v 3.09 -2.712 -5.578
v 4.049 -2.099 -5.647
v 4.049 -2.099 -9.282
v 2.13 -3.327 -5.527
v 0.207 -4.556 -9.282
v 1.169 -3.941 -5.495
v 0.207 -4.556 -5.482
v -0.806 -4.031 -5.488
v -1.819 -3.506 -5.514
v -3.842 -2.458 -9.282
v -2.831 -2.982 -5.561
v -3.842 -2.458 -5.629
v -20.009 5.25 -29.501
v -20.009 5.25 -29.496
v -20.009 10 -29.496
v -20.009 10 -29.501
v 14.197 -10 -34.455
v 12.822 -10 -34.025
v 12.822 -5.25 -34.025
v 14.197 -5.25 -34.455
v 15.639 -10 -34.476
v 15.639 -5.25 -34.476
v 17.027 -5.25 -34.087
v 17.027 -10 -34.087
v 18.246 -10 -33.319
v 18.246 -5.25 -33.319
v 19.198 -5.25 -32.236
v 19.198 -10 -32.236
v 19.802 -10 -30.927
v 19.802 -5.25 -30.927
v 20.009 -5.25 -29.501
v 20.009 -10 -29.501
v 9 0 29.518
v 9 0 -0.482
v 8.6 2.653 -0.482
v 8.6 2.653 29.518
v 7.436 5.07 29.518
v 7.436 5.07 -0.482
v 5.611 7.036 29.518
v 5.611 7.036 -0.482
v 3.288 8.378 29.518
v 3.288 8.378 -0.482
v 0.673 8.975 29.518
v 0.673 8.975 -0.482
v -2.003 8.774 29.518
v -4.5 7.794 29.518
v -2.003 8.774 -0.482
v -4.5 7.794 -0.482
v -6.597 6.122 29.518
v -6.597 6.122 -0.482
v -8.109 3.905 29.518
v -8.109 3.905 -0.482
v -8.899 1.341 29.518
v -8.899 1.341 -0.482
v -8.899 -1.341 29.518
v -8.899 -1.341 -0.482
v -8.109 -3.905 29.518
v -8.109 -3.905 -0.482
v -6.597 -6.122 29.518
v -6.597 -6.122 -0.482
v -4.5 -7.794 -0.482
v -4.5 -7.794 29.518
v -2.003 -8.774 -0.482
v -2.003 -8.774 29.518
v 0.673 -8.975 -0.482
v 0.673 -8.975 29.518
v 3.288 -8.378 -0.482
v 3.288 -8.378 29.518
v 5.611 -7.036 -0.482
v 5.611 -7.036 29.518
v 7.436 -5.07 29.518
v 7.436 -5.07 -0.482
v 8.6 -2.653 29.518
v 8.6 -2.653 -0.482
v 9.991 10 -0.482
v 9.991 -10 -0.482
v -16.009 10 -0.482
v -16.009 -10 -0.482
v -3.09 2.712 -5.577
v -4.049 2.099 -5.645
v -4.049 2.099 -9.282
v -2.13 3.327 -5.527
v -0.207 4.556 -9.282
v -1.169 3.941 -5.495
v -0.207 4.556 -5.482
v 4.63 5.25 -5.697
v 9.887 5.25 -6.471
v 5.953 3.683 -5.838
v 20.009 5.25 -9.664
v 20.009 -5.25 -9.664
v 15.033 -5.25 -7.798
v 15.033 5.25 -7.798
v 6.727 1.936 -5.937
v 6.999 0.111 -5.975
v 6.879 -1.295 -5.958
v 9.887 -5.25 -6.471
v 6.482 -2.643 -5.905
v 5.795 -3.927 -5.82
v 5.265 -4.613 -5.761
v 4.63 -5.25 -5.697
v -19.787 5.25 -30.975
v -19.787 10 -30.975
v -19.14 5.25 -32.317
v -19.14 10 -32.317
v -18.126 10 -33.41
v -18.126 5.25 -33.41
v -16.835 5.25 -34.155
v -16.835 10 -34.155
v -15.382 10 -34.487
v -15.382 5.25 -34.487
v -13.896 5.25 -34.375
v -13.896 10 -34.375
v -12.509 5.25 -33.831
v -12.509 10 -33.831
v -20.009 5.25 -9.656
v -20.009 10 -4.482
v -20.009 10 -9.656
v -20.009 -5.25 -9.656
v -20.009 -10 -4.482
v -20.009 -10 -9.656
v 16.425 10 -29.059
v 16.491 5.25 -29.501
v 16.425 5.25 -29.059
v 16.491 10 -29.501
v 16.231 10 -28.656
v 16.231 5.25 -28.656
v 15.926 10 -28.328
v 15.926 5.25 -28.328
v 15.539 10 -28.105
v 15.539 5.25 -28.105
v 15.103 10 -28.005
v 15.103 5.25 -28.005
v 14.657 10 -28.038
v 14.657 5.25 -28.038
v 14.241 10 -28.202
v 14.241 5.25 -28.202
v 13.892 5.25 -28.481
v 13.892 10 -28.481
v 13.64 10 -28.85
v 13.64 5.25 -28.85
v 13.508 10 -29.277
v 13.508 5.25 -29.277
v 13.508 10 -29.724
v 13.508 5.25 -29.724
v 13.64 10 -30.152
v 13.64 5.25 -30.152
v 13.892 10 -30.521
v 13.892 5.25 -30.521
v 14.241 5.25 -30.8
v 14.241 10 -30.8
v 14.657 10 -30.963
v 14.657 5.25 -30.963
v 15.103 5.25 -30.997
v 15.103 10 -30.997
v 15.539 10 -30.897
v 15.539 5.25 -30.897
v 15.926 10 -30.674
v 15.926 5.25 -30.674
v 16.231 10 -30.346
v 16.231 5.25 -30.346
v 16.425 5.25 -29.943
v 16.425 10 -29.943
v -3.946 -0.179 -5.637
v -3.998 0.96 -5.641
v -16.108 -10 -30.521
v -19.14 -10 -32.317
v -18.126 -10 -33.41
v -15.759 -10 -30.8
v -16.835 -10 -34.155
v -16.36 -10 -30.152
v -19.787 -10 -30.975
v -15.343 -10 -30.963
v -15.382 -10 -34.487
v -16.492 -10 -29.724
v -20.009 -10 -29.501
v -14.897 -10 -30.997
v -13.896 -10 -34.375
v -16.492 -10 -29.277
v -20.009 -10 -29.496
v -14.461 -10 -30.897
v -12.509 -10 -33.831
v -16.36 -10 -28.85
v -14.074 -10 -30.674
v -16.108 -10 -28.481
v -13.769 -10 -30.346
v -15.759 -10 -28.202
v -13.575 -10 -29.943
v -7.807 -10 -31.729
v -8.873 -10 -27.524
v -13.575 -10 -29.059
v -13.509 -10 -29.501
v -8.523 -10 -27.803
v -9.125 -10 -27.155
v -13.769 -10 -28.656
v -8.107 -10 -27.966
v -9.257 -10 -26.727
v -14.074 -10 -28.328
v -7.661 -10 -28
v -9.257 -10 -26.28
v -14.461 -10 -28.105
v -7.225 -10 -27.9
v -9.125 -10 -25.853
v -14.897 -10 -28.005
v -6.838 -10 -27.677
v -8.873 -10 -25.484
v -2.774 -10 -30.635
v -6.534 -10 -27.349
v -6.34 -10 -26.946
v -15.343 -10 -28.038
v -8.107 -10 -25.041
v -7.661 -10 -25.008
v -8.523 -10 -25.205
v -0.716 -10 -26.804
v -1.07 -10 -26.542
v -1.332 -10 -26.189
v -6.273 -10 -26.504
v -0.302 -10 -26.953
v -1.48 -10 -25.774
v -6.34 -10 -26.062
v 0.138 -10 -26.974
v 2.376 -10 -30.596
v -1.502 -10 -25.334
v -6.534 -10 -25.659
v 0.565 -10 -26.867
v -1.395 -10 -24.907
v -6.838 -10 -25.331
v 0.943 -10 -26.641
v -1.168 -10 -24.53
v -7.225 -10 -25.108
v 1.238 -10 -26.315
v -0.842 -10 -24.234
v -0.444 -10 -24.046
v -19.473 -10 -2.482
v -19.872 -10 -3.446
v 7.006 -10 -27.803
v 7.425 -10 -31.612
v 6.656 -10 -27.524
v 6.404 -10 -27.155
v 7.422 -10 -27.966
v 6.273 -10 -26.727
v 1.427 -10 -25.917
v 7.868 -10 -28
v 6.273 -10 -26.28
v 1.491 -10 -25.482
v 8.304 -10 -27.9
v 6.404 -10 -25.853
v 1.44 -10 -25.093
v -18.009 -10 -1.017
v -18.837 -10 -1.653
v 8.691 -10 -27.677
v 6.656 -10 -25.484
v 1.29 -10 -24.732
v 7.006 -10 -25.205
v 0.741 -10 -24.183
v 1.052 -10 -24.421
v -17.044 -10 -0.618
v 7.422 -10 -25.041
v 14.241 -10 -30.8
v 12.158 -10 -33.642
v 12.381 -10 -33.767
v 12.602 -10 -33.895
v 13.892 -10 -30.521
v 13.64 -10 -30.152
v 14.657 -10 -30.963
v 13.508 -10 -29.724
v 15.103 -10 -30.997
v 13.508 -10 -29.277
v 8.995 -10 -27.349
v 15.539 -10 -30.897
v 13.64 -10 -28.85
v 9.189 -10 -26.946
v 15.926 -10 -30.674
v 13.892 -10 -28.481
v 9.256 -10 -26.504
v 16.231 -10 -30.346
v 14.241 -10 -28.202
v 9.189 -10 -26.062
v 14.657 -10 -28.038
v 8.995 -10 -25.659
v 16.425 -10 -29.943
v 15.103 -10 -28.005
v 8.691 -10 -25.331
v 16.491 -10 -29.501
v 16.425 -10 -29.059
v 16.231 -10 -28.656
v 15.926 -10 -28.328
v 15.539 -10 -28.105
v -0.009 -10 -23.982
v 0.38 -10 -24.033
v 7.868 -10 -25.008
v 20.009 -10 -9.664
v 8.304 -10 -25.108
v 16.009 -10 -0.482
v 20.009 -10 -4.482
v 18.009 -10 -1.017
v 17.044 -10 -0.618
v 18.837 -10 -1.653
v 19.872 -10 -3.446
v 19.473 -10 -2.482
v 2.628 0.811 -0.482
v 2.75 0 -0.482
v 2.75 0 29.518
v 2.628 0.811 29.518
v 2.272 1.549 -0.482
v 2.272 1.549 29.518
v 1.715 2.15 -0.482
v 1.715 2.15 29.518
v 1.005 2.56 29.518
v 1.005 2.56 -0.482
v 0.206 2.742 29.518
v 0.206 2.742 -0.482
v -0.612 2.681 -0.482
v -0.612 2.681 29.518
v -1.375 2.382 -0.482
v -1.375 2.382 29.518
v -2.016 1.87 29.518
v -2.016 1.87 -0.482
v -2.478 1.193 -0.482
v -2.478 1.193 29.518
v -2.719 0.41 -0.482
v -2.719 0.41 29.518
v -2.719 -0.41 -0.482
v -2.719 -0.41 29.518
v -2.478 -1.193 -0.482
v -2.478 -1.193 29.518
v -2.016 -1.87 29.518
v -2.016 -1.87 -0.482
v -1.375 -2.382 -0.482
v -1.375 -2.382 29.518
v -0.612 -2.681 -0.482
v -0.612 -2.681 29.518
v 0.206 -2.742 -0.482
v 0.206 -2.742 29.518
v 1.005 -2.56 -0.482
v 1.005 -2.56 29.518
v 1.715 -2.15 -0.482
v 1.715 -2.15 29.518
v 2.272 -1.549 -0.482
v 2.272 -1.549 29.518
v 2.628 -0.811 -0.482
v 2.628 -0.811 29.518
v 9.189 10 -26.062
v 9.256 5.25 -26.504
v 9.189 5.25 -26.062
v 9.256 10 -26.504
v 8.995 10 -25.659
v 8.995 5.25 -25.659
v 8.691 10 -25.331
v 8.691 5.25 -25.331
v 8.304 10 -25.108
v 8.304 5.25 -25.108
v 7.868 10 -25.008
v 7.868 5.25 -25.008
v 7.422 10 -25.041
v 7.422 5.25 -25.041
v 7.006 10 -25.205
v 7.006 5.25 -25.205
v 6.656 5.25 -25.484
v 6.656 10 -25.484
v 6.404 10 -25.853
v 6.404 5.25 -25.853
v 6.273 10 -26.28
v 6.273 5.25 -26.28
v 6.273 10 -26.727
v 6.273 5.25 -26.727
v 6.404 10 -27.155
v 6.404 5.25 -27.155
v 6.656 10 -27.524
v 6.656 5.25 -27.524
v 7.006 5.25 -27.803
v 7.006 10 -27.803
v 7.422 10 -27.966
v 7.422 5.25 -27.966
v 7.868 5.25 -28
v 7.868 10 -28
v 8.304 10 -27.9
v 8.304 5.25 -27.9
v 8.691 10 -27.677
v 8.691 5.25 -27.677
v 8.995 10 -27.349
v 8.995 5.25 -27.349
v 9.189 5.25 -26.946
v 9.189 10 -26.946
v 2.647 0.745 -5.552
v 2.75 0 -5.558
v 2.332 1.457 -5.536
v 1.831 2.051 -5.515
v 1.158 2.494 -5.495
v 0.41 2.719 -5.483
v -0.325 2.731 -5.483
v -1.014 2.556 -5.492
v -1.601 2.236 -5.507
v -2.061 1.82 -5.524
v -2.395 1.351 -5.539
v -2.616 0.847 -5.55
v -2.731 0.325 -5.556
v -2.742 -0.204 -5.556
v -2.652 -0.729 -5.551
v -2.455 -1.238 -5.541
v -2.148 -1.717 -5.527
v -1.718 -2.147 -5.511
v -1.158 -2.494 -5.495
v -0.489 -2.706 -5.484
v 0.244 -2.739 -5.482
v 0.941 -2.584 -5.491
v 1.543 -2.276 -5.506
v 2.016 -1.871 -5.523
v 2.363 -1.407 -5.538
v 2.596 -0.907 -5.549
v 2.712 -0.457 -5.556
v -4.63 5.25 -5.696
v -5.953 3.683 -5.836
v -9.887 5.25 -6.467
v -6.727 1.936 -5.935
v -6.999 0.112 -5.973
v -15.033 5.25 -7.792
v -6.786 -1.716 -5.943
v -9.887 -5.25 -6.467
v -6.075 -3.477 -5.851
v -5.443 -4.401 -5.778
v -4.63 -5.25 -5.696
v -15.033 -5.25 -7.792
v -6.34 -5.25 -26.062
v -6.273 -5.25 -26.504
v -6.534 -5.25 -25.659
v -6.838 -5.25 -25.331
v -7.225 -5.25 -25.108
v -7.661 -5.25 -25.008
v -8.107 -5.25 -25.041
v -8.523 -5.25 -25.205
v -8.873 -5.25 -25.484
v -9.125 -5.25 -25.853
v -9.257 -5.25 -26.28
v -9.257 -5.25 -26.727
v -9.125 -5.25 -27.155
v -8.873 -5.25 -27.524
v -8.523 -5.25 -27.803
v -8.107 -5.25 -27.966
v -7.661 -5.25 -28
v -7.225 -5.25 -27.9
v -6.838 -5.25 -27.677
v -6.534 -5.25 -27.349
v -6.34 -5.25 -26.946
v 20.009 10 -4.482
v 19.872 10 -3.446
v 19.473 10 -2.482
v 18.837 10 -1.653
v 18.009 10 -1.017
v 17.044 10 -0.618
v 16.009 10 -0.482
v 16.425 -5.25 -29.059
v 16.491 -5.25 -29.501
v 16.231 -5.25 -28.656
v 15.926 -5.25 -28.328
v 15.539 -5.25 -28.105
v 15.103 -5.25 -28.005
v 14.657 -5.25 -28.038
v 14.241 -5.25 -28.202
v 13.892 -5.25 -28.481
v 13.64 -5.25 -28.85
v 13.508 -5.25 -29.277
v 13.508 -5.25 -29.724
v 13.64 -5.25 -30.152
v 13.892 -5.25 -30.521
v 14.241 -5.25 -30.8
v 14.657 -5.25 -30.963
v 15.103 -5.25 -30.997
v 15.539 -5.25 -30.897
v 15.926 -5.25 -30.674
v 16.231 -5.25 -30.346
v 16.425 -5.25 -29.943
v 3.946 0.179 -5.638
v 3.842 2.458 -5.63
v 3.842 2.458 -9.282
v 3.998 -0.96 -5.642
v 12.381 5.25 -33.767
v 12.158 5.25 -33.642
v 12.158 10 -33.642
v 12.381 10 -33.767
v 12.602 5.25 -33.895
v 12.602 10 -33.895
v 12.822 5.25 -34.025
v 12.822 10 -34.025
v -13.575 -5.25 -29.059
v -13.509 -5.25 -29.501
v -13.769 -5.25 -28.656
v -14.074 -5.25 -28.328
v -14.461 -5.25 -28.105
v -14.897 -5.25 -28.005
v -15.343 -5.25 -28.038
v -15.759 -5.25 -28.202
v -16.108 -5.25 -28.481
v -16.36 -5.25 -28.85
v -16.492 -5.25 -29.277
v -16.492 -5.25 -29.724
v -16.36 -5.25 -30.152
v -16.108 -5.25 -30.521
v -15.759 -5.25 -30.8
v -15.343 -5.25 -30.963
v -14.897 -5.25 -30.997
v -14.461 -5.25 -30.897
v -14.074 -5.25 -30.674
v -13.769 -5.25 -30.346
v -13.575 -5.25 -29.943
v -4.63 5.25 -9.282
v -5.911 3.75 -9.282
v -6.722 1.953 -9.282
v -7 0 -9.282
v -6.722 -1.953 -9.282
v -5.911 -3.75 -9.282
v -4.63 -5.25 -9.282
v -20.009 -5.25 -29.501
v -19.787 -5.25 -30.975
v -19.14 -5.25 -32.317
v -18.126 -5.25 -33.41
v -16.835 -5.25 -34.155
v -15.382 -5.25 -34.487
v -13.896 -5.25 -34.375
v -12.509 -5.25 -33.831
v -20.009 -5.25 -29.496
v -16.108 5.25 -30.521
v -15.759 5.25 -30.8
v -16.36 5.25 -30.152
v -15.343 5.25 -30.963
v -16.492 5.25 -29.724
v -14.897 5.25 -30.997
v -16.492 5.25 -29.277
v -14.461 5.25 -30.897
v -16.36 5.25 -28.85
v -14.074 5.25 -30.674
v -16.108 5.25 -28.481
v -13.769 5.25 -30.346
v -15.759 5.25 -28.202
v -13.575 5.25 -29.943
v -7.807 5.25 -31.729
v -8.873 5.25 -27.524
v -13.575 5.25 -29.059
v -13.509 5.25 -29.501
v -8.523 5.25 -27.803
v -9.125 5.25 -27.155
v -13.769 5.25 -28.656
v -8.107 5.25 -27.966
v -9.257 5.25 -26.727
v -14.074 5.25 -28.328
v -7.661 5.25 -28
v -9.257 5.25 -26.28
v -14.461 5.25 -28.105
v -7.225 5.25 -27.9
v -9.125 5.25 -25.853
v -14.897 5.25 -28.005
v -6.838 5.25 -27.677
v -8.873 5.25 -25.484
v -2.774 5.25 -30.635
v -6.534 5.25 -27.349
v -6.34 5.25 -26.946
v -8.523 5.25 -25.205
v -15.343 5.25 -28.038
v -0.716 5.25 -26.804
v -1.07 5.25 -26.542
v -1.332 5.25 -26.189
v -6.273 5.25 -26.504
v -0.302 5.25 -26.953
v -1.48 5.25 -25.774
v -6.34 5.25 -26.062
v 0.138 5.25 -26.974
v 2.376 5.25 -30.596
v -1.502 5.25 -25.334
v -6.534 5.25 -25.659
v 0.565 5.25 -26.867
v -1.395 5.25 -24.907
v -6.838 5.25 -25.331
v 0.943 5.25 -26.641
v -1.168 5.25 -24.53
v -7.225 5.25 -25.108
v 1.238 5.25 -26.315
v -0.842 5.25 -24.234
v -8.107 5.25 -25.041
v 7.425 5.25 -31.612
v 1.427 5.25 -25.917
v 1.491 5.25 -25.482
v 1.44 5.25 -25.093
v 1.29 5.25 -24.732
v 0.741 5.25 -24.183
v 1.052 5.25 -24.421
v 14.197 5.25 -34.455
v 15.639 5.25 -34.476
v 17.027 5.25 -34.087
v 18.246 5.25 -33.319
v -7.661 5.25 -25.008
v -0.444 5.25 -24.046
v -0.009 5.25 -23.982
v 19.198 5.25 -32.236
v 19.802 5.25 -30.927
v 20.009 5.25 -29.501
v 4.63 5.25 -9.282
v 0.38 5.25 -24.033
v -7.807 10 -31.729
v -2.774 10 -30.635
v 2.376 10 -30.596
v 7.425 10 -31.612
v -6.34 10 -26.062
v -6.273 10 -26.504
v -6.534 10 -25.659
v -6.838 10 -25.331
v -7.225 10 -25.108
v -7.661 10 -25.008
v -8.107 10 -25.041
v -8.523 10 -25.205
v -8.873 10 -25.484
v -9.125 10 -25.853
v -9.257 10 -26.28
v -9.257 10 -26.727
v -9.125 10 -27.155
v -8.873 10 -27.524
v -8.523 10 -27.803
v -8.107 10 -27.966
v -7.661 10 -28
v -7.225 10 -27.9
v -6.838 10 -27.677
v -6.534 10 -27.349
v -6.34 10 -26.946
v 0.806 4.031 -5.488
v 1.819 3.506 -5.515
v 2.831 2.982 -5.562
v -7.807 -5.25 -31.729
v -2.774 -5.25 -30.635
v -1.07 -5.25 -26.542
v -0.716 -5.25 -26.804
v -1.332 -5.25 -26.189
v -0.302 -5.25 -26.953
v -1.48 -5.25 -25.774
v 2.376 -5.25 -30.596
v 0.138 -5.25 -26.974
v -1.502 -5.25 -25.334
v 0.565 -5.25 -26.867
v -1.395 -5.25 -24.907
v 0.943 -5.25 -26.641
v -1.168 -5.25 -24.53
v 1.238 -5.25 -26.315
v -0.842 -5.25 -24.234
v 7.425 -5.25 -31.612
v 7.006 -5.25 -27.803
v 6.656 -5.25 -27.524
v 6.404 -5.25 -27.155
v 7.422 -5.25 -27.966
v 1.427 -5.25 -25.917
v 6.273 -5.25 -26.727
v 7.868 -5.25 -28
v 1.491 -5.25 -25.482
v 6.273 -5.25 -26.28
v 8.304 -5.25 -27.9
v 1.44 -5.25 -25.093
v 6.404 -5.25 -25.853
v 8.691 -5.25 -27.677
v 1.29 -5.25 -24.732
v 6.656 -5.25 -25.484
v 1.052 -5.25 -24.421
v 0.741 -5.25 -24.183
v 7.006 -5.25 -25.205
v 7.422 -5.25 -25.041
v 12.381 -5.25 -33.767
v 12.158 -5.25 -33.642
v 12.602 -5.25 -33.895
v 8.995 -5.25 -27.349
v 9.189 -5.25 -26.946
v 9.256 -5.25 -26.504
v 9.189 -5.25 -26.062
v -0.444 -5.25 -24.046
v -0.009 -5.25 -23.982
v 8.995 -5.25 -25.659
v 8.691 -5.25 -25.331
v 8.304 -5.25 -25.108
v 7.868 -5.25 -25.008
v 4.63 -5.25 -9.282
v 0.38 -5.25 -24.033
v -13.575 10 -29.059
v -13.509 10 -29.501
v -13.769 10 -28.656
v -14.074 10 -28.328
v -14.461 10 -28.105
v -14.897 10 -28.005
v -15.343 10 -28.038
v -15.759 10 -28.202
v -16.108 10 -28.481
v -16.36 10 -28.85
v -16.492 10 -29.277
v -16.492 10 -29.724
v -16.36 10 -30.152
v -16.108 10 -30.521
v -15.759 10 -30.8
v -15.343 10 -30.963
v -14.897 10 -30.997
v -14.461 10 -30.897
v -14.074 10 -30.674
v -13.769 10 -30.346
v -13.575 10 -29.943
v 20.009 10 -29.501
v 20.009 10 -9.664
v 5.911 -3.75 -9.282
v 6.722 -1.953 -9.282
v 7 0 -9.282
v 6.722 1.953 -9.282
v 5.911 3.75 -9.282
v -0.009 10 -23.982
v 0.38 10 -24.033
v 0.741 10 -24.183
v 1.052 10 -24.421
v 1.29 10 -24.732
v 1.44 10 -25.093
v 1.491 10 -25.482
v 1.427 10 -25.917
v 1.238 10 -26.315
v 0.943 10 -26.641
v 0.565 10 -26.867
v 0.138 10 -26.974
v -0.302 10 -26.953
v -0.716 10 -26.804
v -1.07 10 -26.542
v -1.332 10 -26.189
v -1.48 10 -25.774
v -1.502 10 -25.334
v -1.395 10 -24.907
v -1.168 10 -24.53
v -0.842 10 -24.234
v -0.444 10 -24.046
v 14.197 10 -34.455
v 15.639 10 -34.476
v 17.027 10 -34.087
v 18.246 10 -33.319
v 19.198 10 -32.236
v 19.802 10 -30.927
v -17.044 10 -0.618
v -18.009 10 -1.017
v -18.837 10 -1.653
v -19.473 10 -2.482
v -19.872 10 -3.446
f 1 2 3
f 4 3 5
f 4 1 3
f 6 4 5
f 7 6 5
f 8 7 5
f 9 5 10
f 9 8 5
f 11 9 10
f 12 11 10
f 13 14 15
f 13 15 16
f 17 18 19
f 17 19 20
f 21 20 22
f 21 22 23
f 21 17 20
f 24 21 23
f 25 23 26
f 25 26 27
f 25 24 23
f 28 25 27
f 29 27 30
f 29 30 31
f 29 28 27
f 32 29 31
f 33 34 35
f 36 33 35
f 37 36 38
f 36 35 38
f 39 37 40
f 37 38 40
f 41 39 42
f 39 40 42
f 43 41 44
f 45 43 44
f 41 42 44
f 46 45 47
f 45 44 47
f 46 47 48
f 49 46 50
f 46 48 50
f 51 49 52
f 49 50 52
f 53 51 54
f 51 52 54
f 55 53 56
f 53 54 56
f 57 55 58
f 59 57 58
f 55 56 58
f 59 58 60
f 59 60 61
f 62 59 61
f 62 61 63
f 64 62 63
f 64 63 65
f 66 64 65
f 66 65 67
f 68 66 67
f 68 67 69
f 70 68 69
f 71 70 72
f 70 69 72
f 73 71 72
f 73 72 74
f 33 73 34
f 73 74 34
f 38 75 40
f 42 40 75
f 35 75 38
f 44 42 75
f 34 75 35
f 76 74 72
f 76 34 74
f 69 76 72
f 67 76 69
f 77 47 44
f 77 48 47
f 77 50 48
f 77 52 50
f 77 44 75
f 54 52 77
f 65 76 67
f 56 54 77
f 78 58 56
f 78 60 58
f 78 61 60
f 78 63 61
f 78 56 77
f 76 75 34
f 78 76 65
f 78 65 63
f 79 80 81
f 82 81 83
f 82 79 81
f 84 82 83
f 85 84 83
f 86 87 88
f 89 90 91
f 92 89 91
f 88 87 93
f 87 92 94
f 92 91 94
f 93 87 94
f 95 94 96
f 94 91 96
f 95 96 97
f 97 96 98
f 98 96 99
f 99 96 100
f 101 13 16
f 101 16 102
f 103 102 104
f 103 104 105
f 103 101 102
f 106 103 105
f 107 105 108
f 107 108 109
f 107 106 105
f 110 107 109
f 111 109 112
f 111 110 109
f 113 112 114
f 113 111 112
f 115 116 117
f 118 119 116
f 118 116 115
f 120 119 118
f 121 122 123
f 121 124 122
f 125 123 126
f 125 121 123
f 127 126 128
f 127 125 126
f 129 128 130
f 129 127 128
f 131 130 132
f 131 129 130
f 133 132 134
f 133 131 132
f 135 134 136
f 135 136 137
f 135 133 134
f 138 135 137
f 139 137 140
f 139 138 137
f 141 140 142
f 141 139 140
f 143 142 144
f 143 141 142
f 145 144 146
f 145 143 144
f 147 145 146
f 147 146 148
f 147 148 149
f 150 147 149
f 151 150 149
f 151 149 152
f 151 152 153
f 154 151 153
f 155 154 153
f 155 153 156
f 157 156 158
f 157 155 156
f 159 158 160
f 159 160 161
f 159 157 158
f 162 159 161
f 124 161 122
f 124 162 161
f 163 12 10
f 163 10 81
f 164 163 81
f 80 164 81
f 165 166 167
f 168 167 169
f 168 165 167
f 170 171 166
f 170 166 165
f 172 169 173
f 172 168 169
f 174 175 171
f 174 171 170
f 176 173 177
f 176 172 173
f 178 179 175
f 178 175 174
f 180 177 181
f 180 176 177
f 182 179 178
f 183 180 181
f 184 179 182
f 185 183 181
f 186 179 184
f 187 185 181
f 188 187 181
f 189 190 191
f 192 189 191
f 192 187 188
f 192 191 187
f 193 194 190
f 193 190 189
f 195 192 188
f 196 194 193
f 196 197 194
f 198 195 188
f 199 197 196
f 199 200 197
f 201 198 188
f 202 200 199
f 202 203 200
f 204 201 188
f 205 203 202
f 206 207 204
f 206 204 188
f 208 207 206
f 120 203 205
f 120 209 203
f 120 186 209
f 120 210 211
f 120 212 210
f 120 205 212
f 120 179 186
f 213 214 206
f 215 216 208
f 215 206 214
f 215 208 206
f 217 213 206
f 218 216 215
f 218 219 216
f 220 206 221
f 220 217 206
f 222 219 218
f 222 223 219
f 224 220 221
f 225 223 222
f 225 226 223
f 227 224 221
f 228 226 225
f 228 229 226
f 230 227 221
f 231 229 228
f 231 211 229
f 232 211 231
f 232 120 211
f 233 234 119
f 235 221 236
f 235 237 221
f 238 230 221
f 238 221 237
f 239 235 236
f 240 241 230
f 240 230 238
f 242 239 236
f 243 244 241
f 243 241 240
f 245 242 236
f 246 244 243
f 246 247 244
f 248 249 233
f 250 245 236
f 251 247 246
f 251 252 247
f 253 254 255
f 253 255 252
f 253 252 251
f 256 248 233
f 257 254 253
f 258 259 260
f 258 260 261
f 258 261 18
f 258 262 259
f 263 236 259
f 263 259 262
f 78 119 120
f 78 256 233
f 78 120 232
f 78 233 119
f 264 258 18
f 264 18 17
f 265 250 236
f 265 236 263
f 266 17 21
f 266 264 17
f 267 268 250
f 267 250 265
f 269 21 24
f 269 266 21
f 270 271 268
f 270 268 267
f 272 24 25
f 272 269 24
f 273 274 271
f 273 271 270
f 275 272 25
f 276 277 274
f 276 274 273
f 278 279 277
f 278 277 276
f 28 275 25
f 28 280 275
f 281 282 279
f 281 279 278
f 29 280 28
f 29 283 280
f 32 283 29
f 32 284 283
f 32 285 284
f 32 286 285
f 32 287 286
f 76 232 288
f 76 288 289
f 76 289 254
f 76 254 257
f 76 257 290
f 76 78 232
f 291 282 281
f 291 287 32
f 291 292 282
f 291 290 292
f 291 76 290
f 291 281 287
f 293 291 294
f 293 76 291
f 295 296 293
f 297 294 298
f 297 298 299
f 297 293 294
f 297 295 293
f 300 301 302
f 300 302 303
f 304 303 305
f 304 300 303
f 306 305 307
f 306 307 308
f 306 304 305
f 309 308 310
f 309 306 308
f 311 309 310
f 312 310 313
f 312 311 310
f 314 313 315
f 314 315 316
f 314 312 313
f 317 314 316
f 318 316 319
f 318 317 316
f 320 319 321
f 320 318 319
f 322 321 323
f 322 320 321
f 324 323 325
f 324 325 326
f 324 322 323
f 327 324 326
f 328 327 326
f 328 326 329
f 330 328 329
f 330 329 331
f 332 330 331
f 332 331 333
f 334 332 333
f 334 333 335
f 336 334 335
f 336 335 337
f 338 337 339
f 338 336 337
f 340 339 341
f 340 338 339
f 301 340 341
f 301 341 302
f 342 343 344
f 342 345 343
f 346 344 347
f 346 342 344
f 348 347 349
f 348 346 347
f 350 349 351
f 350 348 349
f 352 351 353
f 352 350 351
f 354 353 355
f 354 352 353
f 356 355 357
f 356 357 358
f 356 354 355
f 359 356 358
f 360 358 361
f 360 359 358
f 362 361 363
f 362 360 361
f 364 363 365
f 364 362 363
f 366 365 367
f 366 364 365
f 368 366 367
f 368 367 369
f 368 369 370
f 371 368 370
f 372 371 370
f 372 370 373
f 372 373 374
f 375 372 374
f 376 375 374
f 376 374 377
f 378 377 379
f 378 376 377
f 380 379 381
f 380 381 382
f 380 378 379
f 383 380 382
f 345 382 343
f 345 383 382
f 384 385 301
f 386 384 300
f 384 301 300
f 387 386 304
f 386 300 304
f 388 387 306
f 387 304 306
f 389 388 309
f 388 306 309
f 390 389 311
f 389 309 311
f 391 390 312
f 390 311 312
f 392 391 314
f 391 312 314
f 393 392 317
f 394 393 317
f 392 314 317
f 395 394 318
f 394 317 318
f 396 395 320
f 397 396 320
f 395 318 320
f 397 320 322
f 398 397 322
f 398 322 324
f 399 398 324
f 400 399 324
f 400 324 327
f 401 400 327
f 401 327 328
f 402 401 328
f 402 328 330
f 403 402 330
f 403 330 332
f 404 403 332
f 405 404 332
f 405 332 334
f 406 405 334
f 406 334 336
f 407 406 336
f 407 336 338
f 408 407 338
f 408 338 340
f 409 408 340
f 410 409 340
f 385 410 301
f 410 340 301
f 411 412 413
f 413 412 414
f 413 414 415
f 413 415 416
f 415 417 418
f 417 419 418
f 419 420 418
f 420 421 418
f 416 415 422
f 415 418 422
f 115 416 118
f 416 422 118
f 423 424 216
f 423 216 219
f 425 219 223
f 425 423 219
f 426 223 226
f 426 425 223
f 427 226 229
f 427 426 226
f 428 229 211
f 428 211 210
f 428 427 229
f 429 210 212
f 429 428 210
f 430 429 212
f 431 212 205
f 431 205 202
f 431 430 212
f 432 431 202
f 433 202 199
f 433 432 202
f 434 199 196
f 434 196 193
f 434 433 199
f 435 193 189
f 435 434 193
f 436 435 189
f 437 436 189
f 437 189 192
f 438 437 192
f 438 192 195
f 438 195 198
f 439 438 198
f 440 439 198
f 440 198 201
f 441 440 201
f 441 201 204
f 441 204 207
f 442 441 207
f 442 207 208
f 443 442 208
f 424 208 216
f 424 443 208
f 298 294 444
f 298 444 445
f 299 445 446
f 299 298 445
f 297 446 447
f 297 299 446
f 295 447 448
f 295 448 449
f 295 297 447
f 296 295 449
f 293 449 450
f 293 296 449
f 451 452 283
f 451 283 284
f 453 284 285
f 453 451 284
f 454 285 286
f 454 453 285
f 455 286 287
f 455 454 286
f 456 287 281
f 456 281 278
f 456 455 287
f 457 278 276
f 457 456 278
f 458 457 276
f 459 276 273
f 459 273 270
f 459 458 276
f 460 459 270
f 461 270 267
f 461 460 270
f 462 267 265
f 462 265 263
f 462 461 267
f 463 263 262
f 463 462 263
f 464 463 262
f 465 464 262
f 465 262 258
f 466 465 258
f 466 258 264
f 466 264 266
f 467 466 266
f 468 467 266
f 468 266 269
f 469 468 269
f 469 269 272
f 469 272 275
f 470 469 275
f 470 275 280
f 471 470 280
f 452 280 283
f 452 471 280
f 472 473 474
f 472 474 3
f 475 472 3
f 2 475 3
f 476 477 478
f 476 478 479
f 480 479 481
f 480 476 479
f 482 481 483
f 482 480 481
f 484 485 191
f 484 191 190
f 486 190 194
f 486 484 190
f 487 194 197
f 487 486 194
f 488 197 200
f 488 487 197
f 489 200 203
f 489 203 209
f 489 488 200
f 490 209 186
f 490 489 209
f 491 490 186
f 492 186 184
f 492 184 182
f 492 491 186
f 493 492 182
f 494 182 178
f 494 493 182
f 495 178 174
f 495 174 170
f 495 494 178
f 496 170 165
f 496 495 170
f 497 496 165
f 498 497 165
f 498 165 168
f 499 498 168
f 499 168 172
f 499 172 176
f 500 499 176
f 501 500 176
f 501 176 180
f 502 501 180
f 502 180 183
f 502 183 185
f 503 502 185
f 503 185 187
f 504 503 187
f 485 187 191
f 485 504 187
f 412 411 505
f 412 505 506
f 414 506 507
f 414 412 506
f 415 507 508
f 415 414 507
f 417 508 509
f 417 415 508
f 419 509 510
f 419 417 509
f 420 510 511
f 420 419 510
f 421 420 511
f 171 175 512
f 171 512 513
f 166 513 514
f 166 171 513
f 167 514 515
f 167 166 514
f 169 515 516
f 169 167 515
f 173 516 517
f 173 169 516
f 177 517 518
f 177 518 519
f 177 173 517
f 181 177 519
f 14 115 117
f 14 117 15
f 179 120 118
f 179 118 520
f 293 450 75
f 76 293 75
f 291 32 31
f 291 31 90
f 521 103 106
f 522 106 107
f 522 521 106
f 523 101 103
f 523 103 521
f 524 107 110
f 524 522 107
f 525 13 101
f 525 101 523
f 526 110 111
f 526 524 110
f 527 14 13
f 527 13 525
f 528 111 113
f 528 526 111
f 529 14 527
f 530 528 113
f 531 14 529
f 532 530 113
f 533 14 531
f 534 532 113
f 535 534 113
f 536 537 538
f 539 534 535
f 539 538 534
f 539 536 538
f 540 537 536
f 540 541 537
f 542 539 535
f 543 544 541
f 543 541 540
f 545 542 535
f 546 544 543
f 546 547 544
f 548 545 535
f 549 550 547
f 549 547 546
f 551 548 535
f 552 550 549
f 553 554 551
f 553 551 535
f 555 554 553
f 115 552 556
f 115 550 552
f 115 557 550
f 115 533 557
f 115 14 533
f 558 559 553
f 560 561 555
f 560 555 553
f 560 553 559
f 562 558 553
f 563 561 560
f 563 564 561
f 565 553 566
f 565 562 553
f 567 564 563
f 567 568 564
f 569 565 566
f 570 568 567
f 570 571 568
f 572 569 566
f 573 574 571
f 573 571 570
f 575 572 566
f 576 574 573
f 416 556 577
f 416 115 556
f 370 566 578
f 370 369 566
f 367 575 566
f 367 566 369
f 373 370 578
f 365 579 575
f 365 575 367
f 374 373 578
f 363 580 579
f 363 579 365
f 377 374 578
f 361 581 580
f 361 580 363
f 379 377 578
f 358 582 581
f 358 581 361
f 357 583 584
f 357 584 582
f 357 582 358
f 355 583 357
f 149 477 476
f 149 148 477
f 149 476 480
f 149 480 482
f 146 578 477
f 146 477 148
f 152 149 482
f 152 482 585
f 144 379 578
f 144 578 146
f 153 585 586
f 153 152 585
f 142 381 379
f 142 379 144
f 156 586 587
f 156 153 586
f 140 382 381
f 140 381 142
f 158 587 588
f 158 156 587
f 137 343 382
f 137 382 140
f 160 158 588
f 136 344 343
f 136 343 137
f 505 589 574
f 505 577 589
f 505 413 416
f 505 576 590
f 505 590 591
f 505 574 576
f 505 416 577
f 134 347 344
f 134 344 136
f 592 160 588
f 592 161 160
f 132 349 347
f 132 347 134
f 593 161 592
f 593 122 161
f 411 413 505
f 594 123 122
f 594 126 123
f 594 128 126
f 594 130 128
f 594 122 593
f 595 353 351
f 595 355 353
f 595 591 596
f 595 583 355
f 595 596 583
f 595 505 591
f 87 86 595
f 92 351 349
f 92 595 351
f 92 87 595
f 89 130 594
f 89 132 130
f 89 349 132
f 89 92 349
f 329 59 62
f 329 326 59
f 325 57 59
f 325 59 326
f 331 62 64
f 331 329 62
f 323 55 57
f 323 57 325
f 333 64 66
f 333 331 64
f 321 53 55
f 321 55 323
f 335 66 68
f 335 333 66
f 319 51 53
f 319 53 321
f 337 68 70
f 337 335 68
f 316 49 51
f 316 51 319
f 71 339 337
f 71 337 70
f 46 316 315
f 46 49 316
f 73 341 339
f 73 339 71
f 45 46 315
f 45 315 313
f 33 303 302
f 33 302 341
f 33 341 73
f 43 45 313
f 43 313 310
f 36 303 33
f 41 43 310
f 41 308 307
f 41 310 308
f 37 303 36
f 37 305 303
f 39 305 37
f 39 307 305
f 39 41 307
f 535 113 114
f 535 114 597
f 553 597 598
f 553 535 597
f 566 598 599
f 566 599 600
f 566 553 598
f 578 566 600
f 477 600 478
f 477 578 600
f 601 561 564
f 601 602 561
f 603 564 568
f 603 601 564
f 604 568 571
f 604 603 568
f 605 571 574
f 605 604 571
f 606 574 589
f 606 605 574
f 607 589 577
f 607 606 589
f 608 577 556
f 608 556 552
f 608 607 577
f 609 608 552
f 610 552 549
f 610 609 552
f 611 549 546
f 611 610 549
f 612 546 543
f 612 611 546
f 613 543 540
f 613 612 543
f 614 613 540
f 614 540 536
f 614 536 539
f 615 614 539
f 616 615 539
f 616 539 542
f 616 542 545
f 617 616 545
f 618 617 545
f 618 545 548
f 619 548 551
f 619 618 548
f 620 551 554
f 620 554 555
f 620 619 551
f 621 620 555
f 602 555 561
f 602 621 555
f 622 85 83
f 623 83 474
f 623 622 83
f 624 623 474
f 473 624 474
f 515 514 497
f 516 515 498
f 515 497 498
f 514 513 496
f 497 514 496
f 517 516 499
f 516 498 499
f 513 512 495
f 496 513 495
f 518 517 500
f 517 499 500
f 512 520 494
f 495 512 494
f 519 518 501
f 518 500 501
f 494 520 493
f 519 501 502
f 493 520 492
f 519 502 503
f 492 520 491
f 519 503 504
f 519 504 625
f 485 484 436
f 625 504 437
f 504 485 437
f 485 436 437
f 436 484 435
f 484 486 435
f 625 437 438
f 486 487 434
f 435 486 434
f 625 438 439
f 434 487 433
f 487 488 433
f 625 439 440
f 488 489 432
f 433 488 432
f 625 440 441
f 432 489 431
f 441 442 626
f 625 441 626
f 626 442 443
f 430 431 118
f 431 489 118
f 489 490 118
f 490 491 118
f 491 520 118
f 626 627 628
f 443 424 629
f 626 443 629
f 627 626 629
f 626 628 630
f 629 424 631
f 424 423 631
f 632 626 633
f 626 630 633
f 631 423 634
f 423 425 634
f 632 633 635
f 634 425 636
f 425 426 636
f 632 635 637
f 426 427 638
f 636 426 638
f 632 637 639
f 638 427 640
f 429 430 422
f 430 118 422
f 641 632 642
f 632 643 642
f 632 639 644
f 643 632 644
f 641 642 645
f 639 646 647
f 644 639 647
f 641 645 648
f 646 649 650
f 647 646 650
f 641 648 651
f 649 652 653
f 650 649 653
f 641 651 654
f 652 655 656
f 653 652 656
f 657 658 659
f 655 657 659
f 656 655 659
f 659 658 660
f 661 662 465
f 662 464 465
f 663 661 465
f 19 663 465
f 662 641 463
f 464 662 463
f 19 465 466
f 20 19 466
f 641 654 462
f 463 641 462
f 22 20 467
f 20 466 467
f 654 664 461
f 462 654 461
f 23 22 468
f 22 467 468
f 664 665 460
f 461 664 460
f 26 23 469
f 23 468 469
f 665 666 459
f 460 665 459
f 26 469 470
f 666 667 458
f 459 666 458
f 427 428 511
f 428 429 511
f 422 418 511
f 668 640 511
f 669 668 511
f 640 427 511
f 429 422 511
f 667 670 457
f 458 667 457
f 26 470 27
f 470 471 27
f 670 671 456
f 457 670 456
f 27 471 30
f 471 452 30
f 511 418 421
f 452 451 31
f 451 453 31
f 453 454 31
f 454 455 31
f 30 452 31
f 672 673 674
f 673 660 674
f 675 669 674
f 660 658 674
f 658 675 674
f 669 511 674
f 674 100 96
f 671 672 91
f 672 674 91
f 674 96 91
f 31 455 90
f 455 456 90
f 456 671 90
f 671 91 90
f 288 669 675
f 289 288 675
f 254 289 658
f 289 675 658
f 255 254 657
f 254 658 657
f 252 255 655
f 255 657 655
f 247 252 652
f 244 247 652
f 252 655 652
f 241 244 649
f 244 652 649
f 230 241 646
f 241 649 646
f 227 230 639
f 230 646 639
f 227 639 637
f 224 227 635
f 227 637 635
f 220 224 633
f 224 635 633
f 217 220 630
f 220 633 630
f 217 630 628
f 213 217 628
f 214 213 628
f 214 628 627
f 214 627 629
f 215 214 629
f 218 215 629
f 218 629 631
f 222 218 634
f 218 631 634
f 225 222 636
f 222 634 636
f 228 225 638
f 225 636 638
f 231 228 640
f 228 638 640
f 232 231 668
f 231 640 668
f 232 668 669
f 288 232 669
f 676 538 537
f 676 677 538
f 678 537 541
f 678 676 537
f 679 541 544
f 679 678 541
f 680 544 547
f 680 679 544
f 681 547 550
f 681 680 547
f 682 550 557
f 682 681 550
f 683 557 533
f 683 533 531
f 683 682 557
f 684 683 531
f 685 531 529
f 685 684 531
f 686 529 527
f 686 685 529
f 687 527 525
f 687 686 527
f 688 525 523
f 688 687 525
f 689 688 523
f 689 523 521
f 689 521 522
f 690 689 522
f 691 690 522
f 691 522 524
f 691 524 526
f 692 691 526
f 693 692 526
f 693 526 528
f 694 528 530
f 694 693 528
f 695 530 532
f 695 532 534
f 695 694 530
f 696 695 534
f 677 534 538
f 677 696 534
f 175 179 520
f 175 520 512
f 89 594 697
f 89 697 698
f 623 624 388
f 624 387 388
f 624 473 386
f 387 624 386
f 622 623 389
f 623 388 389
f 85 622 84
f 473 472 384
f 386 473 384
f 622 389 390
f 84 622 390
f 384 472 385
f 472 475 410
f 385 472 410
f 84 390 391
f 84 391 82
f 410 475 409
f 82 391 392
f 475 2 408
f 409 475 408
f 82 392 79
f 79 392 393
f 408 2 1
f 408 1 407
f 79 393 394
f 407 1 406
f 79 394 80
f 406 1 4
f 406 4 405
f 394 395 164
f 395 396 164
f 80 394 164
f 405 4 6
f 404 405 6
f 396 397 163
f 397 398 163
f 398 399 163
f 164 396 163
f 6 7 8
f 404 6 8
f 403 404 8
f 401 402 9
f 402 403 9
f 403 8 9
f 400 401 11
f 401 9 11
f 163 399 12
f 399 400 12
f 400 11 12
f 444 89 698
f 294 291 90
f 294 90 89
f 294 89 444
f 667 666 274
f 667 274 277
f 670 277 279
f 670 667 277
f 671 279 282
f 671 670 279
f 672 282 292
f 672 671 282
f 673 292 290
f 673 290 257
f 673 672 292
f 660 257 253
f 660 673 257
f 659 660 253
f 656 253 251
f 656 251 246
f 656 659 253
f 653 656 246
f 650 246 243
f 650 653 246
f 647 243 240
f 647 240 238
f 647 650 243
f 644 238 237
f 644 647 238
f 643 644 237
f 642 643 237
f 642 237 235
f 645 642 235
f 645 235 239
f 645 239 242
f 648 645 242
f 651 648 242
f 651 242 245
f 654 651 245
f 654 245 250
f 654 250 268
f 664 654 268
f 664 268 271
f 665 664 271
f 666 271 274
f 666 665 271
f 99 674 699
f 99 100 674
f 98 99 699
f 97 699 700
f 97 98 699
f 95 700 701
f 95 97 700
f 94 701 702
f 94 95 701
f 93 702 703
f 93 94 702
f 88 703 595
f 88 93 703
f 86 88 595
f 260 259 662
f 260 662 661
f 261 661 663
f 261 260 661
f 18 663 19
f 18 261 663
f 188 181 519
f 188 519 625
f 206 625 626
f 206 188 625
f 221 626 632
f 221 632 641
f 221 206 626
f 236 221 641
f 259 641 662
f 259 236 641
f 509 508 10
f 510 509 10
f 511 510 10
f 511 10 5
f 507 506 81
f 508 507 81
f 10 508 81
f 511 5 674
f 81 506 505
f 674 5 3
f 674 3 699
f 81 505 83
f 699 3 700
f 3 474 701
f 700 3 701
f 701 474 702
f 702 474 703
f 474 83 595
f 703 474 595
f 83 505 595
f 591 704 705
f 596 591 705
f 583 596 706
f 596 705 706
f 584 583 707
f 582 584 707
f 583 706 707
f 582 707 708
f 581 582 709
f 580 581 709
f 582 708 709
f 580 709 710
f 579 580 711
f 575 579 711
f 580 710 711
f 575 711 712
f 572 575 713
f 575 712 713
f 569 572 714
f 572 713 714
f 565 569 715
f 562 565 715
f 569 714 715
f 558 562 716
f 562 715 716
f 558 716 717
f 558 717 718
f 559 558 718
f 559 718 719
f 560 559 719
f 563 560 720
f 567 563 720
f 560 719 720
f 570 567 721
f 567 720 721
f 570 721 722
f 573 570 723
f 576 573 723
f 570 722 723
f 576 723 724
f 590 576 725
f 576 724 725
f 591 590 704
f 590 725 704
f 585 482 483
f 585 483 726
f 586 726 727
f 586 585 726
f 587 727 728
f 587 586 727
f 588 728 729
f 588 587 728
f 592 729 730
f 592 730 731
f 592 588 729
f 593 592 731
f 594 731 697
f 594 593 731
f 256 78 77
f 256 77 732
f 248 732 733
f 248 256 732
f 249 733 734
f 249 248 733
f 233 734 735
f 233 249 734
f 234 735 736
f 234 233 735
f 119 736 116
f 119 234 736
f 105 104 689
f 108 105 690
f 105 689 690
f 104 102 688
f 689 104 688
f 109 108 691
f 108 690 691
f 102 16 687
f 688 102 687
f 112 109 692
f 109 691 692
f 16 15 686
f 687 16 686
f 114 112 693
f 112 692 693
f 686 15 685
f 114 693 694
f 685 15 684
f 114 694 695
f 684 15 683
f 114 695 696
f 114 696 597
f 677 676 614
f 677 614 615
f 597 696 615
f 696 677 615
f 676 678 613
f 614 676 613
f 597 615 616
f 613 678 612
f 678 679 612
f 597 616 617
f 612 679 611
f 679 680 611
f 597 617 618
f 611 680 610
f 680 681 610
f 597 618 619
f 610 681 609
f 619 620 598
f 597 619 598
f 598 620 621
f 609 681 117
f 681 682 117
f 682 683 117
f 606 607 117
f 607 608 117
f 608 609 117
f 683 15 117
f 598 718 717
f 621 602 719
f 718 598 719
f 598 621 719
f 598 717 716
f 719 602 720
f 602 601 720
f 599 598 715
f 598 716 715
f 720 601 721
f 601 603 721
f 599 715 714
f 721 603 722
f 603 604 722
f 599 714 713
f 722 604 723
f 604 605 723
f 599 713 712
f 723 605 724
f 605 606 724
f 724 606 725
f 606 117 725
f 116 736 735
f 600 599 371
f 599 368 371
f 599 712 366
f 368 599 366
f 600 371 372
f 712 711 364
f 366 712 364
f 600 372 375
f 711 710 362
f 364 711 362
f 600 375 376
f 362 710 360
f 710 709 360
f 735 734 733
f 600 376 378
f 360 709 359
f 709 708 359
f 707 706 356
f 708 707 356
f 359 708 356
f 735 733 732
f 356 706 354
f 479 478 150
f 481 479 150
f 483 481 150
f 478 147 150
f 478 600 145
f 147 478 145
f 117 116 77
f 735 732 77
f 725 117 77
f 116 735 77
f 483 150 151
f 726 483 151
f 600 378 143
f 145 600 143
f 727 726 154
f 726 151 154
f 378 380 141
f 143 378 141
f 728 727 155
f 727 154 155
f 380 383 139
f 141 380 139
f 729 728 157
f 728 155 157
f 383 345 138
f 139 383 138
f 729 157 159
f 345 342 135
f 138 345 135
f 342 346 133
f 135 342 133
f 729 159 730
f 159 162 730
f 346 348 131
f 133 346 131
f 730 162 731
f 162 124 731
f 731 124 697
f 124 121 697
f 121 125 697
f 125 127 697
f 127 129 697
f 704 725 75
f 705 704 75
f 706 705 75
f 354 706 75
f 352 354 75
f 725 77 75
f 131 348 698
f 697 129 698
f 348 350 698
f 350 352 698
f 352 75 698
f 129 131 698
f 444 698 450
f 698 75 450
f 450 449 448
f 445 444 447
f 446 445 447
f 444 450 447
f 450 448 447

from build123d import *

# Parameters (mm, degrees)
F0_R     = 1.5
F1_DEPTH = 10
F2_DEPTH = 5.25
F3_R     = 9
F3_R_2   = 7
F3_R_3   = 2.75
F4_DEPTH = 30
F5_DEPTH = 8.8
F6_DEPTH = 5.0771655029


# Not quite as in the source:
# - ends of sketch curves that miss each other by under 0.0002 mm in the source are joined


with BuildPart() as f1:
    # F0 (on Front) → F1 (new body, symmetric)
    with BuildSketch(Plane.XZ):
        with BuildLine():
            ThreePointArc((20.0087781194, -9.6635037267), (10.2175079385, -6.5385316067), (-0.005862, -5.4815880859))
            ThreePointArc((-0.005862, -5.4815880859), (-10.2228373041, -6.5359722724), (-20.0087868417, -9.6558283627))
            Line((-20.0087868417, -9.6558283627), (-20.008784, -29.496459))
            Line((-20.008784, -29.496459), (-20.008784, -29.500828))
            ThreePointArc((-20.008784, -29.500828), (-17.5087901054, -33.8309491846), (-12.5087967107, -33.8309485011))
            ThreePointArc((-12.5087967107, -33.8309485011), (-0.2003110708, -30.4823215942), (12.1580317725, -33.6419823498))
            ThreePointArc((12.1580317725, -33.6419823498), (12.4912575647, -33.830982099), (12.8215481384, -34.0250657685))
            ThreePointArc((12.8215481384, -34.0250657685), (17.6641901361, -33.7471454023), (20.008785, -29.500824))
            Line((20.008785, -29.500824), (20.0087781194, -9.6635037267))
        make_face()
        with Locations((-15.008794, -29.500828)):
            Circle(F0_R, mode=Mode.SUBTRACT)
        with Locations((-7.773364, -26.503811)):
            Circle(F0_R, mode=Mode.SUBTRACT)
        with BuildLine():
            ThreePointArc((-0.008573175, -23.9815880161), (1.0519448888, -24.4210055509), (1.491207, -25.481588))
            ThreePointArc((1.491207, -25.481588), (-1.0695308888, -26.5421704491), (-0.008573175, -23.9815880161))
        make_face(mode=Mode.SUBTRACT)
        with Locations((7.755782, -26.503815)):
            Circle(F0_R, mode=Mode.SUBTRACT)
        with Locations((14.991208, -29.500824)):
            Circle(F0_R, mode=Mode.SUBTRACT)
        with BuildLine():
            Line((-0.0051292502, -0.48159), (-0.0058619999, -5.4815880859))
            ThreePointArc((-0.0058619999, -5.4815880859), (10.2175079385, -6.5385316067), (20.0087781194, -9.6635037267))
            Line((20.0087781194, -9.6635037267), (20.008783, -4.481588))
            ThreePointArc((20.008783, -4.481588), (18.8372111247, -1.6531608753), (16.008784, -0.481588))
            Line((16.008784, -0.481588), (9.991212, -0.48159))
            Line((9.991212, -0.48159), (-0.0051292502, -0.48159))
        make_face()
        with BuildLine():
            ThreePointArc((-20.0087868417, -9.6558283627), (-10.2228373041, -6.5359722724), (-0.005862, -5.4815880859))
            Line((-0.005862, -5.4815880859), (-0.0051292502, -0.48159))
            Line((-0.0051292502, -0.48159), (-10.008792, -0.48159))
            Line((-10.008792, -0.48159), (-16.008784, -0.48159))
            ThreePointArc((-16.008784, -0.48159), (-18.8372111247, -1.6531608753), (-20.008784, -4.481588))
            Line((-20.008784, -4.481588), (-20.0087868417, -9.6558283627))
        make_face()
    extrude(amount=F1_DEPTH, both=True)

    # F0 (on Front) → F2 (cut, symmetric)
    with BuildSketch(Plane.XZ):
        with BuildLine():
            ThreePointArc((20.0087781194, -9.6635037267), (10.2175079385, -6.5385316067), (-0.005862, -5.4815880859))
            ThreePointArc((-0.005862, -5.4815880859), (-10.2228373041, -6.5359722724), (-20.0087868417, -9.6558283627))
            Line((-20.0087868417, -9.6558283627), (-20.008784, -29.496459))
            Line((-20.008784, -29.496459), (-20.008784, -29.500828))
            ThreePointArc((-20.008784, -29.500828), (-17.5087901054, -33.8309491846), (-12.5087967107, -33.8309485011))
            ThreePointArc((-12.5087967107, -33.8309485011), (-0.2003110708, -30.4823215942), (12.1580317725, -33.6419823498))
            ThreePointArc((12.1580317725, -33.6419823498), (12.4912575647, -33.830982099), (12.8215481384, -34.0250657685))
            ThreePointArc((12.8215481384, -34.0250657685), (17.6641901361, -33.7471454023), (20.008785, -29.500824))
            Line((20.008785, -29.500824), (20.0087781194, -9.6635037267))
        make_face()
        with Locations((-15.008794, -29.500828)):
            Circle(F0_R, mode=Mode.SUBTRACT)
        with Locations((-7.773364, -26.503811)):
            Circle(F0_R, mode=Mode.SUBTRACT)
        with BuildLine():
            ThreePointArc((-0.008573175, -23.9815880161), (1.0519448888, -24.4210055509), (1.491207, -25.481588))
            ThreePointArc((1.491207, -25.481588), (-1.0695308888, -26.5421704491), (-0.008573175, -23.9815880161))
        make_face(mode=Mode.SUBTRACT)
        with Locations((7.755782, -26.503815)):
            Circle(F0_R, mode=Mode.SUBTRACT)
        with Locations((14.991208, -29.500824)):
            Circle(F0_R, mode=Mode.SUBTRACT)
    extrude(amount=F2_DEPTH, both=True, mode=Mode.SUBTRACT)

    # F3 (on face) → F4 (join)
    with BuildSketch(Plane.XY.offset(-0.48159)):
        Circle(F3_R)
        Circle(F3_R_2, mode=Mode.SUBTRACT)
        Circle(F3_R_2)
        Polygon((3.8423572259, 2.4575647055), (4.0494920794, -2.0987966153), (0.2071348534, -4.5563613208), (-3.8423572259, -2.4575647055), (-4.0494920794, 2.0987966153), (-0.2071348534, 4.5563613208), align=None, mode=Mode.SUBTRACT)
        Polygon((0.2071348534, -4.5563613208), (4.0494920794, -2.0987966153), (3.8423572259, 2.4575647055), (-0.2071348534, 4.5563613208), (-4.0494920794, 2.0987966153), (-3.8423572259, -2.4575647055), align=None)
        Circle(F3_R_3, mode=Mode.SUBTRACT)
    extrude(amount=F4_DEPTH)

    # F3 (on face) → F5 (join)
    with BuildSketch(Plane.XY.offset(-0.48159)):
        Circle(F3_R_2)
        Polygon((3.8423572259, 2.4575647055), (4.0494920794, -2.0987966153), (0.2071348534, -4.5563613208), (-3.8423572259, -2.4575647055), (-4.0494920794, 2.0987966153), (-0.2071348534, 4.5563613208), align=None, mode=Mode.SUBTRACT)
    extrude(amount=-F5_DEPTH)

    # F3 (on face) → F6 (cut, through all)
    with BuildSketch(Plane.XY.offset(-0.48159)):
        Circle(F3_R_3)
    extrude(amount=-F6_DEPTH, mode=Mode.SUBTRACT)


solid = f1.part
